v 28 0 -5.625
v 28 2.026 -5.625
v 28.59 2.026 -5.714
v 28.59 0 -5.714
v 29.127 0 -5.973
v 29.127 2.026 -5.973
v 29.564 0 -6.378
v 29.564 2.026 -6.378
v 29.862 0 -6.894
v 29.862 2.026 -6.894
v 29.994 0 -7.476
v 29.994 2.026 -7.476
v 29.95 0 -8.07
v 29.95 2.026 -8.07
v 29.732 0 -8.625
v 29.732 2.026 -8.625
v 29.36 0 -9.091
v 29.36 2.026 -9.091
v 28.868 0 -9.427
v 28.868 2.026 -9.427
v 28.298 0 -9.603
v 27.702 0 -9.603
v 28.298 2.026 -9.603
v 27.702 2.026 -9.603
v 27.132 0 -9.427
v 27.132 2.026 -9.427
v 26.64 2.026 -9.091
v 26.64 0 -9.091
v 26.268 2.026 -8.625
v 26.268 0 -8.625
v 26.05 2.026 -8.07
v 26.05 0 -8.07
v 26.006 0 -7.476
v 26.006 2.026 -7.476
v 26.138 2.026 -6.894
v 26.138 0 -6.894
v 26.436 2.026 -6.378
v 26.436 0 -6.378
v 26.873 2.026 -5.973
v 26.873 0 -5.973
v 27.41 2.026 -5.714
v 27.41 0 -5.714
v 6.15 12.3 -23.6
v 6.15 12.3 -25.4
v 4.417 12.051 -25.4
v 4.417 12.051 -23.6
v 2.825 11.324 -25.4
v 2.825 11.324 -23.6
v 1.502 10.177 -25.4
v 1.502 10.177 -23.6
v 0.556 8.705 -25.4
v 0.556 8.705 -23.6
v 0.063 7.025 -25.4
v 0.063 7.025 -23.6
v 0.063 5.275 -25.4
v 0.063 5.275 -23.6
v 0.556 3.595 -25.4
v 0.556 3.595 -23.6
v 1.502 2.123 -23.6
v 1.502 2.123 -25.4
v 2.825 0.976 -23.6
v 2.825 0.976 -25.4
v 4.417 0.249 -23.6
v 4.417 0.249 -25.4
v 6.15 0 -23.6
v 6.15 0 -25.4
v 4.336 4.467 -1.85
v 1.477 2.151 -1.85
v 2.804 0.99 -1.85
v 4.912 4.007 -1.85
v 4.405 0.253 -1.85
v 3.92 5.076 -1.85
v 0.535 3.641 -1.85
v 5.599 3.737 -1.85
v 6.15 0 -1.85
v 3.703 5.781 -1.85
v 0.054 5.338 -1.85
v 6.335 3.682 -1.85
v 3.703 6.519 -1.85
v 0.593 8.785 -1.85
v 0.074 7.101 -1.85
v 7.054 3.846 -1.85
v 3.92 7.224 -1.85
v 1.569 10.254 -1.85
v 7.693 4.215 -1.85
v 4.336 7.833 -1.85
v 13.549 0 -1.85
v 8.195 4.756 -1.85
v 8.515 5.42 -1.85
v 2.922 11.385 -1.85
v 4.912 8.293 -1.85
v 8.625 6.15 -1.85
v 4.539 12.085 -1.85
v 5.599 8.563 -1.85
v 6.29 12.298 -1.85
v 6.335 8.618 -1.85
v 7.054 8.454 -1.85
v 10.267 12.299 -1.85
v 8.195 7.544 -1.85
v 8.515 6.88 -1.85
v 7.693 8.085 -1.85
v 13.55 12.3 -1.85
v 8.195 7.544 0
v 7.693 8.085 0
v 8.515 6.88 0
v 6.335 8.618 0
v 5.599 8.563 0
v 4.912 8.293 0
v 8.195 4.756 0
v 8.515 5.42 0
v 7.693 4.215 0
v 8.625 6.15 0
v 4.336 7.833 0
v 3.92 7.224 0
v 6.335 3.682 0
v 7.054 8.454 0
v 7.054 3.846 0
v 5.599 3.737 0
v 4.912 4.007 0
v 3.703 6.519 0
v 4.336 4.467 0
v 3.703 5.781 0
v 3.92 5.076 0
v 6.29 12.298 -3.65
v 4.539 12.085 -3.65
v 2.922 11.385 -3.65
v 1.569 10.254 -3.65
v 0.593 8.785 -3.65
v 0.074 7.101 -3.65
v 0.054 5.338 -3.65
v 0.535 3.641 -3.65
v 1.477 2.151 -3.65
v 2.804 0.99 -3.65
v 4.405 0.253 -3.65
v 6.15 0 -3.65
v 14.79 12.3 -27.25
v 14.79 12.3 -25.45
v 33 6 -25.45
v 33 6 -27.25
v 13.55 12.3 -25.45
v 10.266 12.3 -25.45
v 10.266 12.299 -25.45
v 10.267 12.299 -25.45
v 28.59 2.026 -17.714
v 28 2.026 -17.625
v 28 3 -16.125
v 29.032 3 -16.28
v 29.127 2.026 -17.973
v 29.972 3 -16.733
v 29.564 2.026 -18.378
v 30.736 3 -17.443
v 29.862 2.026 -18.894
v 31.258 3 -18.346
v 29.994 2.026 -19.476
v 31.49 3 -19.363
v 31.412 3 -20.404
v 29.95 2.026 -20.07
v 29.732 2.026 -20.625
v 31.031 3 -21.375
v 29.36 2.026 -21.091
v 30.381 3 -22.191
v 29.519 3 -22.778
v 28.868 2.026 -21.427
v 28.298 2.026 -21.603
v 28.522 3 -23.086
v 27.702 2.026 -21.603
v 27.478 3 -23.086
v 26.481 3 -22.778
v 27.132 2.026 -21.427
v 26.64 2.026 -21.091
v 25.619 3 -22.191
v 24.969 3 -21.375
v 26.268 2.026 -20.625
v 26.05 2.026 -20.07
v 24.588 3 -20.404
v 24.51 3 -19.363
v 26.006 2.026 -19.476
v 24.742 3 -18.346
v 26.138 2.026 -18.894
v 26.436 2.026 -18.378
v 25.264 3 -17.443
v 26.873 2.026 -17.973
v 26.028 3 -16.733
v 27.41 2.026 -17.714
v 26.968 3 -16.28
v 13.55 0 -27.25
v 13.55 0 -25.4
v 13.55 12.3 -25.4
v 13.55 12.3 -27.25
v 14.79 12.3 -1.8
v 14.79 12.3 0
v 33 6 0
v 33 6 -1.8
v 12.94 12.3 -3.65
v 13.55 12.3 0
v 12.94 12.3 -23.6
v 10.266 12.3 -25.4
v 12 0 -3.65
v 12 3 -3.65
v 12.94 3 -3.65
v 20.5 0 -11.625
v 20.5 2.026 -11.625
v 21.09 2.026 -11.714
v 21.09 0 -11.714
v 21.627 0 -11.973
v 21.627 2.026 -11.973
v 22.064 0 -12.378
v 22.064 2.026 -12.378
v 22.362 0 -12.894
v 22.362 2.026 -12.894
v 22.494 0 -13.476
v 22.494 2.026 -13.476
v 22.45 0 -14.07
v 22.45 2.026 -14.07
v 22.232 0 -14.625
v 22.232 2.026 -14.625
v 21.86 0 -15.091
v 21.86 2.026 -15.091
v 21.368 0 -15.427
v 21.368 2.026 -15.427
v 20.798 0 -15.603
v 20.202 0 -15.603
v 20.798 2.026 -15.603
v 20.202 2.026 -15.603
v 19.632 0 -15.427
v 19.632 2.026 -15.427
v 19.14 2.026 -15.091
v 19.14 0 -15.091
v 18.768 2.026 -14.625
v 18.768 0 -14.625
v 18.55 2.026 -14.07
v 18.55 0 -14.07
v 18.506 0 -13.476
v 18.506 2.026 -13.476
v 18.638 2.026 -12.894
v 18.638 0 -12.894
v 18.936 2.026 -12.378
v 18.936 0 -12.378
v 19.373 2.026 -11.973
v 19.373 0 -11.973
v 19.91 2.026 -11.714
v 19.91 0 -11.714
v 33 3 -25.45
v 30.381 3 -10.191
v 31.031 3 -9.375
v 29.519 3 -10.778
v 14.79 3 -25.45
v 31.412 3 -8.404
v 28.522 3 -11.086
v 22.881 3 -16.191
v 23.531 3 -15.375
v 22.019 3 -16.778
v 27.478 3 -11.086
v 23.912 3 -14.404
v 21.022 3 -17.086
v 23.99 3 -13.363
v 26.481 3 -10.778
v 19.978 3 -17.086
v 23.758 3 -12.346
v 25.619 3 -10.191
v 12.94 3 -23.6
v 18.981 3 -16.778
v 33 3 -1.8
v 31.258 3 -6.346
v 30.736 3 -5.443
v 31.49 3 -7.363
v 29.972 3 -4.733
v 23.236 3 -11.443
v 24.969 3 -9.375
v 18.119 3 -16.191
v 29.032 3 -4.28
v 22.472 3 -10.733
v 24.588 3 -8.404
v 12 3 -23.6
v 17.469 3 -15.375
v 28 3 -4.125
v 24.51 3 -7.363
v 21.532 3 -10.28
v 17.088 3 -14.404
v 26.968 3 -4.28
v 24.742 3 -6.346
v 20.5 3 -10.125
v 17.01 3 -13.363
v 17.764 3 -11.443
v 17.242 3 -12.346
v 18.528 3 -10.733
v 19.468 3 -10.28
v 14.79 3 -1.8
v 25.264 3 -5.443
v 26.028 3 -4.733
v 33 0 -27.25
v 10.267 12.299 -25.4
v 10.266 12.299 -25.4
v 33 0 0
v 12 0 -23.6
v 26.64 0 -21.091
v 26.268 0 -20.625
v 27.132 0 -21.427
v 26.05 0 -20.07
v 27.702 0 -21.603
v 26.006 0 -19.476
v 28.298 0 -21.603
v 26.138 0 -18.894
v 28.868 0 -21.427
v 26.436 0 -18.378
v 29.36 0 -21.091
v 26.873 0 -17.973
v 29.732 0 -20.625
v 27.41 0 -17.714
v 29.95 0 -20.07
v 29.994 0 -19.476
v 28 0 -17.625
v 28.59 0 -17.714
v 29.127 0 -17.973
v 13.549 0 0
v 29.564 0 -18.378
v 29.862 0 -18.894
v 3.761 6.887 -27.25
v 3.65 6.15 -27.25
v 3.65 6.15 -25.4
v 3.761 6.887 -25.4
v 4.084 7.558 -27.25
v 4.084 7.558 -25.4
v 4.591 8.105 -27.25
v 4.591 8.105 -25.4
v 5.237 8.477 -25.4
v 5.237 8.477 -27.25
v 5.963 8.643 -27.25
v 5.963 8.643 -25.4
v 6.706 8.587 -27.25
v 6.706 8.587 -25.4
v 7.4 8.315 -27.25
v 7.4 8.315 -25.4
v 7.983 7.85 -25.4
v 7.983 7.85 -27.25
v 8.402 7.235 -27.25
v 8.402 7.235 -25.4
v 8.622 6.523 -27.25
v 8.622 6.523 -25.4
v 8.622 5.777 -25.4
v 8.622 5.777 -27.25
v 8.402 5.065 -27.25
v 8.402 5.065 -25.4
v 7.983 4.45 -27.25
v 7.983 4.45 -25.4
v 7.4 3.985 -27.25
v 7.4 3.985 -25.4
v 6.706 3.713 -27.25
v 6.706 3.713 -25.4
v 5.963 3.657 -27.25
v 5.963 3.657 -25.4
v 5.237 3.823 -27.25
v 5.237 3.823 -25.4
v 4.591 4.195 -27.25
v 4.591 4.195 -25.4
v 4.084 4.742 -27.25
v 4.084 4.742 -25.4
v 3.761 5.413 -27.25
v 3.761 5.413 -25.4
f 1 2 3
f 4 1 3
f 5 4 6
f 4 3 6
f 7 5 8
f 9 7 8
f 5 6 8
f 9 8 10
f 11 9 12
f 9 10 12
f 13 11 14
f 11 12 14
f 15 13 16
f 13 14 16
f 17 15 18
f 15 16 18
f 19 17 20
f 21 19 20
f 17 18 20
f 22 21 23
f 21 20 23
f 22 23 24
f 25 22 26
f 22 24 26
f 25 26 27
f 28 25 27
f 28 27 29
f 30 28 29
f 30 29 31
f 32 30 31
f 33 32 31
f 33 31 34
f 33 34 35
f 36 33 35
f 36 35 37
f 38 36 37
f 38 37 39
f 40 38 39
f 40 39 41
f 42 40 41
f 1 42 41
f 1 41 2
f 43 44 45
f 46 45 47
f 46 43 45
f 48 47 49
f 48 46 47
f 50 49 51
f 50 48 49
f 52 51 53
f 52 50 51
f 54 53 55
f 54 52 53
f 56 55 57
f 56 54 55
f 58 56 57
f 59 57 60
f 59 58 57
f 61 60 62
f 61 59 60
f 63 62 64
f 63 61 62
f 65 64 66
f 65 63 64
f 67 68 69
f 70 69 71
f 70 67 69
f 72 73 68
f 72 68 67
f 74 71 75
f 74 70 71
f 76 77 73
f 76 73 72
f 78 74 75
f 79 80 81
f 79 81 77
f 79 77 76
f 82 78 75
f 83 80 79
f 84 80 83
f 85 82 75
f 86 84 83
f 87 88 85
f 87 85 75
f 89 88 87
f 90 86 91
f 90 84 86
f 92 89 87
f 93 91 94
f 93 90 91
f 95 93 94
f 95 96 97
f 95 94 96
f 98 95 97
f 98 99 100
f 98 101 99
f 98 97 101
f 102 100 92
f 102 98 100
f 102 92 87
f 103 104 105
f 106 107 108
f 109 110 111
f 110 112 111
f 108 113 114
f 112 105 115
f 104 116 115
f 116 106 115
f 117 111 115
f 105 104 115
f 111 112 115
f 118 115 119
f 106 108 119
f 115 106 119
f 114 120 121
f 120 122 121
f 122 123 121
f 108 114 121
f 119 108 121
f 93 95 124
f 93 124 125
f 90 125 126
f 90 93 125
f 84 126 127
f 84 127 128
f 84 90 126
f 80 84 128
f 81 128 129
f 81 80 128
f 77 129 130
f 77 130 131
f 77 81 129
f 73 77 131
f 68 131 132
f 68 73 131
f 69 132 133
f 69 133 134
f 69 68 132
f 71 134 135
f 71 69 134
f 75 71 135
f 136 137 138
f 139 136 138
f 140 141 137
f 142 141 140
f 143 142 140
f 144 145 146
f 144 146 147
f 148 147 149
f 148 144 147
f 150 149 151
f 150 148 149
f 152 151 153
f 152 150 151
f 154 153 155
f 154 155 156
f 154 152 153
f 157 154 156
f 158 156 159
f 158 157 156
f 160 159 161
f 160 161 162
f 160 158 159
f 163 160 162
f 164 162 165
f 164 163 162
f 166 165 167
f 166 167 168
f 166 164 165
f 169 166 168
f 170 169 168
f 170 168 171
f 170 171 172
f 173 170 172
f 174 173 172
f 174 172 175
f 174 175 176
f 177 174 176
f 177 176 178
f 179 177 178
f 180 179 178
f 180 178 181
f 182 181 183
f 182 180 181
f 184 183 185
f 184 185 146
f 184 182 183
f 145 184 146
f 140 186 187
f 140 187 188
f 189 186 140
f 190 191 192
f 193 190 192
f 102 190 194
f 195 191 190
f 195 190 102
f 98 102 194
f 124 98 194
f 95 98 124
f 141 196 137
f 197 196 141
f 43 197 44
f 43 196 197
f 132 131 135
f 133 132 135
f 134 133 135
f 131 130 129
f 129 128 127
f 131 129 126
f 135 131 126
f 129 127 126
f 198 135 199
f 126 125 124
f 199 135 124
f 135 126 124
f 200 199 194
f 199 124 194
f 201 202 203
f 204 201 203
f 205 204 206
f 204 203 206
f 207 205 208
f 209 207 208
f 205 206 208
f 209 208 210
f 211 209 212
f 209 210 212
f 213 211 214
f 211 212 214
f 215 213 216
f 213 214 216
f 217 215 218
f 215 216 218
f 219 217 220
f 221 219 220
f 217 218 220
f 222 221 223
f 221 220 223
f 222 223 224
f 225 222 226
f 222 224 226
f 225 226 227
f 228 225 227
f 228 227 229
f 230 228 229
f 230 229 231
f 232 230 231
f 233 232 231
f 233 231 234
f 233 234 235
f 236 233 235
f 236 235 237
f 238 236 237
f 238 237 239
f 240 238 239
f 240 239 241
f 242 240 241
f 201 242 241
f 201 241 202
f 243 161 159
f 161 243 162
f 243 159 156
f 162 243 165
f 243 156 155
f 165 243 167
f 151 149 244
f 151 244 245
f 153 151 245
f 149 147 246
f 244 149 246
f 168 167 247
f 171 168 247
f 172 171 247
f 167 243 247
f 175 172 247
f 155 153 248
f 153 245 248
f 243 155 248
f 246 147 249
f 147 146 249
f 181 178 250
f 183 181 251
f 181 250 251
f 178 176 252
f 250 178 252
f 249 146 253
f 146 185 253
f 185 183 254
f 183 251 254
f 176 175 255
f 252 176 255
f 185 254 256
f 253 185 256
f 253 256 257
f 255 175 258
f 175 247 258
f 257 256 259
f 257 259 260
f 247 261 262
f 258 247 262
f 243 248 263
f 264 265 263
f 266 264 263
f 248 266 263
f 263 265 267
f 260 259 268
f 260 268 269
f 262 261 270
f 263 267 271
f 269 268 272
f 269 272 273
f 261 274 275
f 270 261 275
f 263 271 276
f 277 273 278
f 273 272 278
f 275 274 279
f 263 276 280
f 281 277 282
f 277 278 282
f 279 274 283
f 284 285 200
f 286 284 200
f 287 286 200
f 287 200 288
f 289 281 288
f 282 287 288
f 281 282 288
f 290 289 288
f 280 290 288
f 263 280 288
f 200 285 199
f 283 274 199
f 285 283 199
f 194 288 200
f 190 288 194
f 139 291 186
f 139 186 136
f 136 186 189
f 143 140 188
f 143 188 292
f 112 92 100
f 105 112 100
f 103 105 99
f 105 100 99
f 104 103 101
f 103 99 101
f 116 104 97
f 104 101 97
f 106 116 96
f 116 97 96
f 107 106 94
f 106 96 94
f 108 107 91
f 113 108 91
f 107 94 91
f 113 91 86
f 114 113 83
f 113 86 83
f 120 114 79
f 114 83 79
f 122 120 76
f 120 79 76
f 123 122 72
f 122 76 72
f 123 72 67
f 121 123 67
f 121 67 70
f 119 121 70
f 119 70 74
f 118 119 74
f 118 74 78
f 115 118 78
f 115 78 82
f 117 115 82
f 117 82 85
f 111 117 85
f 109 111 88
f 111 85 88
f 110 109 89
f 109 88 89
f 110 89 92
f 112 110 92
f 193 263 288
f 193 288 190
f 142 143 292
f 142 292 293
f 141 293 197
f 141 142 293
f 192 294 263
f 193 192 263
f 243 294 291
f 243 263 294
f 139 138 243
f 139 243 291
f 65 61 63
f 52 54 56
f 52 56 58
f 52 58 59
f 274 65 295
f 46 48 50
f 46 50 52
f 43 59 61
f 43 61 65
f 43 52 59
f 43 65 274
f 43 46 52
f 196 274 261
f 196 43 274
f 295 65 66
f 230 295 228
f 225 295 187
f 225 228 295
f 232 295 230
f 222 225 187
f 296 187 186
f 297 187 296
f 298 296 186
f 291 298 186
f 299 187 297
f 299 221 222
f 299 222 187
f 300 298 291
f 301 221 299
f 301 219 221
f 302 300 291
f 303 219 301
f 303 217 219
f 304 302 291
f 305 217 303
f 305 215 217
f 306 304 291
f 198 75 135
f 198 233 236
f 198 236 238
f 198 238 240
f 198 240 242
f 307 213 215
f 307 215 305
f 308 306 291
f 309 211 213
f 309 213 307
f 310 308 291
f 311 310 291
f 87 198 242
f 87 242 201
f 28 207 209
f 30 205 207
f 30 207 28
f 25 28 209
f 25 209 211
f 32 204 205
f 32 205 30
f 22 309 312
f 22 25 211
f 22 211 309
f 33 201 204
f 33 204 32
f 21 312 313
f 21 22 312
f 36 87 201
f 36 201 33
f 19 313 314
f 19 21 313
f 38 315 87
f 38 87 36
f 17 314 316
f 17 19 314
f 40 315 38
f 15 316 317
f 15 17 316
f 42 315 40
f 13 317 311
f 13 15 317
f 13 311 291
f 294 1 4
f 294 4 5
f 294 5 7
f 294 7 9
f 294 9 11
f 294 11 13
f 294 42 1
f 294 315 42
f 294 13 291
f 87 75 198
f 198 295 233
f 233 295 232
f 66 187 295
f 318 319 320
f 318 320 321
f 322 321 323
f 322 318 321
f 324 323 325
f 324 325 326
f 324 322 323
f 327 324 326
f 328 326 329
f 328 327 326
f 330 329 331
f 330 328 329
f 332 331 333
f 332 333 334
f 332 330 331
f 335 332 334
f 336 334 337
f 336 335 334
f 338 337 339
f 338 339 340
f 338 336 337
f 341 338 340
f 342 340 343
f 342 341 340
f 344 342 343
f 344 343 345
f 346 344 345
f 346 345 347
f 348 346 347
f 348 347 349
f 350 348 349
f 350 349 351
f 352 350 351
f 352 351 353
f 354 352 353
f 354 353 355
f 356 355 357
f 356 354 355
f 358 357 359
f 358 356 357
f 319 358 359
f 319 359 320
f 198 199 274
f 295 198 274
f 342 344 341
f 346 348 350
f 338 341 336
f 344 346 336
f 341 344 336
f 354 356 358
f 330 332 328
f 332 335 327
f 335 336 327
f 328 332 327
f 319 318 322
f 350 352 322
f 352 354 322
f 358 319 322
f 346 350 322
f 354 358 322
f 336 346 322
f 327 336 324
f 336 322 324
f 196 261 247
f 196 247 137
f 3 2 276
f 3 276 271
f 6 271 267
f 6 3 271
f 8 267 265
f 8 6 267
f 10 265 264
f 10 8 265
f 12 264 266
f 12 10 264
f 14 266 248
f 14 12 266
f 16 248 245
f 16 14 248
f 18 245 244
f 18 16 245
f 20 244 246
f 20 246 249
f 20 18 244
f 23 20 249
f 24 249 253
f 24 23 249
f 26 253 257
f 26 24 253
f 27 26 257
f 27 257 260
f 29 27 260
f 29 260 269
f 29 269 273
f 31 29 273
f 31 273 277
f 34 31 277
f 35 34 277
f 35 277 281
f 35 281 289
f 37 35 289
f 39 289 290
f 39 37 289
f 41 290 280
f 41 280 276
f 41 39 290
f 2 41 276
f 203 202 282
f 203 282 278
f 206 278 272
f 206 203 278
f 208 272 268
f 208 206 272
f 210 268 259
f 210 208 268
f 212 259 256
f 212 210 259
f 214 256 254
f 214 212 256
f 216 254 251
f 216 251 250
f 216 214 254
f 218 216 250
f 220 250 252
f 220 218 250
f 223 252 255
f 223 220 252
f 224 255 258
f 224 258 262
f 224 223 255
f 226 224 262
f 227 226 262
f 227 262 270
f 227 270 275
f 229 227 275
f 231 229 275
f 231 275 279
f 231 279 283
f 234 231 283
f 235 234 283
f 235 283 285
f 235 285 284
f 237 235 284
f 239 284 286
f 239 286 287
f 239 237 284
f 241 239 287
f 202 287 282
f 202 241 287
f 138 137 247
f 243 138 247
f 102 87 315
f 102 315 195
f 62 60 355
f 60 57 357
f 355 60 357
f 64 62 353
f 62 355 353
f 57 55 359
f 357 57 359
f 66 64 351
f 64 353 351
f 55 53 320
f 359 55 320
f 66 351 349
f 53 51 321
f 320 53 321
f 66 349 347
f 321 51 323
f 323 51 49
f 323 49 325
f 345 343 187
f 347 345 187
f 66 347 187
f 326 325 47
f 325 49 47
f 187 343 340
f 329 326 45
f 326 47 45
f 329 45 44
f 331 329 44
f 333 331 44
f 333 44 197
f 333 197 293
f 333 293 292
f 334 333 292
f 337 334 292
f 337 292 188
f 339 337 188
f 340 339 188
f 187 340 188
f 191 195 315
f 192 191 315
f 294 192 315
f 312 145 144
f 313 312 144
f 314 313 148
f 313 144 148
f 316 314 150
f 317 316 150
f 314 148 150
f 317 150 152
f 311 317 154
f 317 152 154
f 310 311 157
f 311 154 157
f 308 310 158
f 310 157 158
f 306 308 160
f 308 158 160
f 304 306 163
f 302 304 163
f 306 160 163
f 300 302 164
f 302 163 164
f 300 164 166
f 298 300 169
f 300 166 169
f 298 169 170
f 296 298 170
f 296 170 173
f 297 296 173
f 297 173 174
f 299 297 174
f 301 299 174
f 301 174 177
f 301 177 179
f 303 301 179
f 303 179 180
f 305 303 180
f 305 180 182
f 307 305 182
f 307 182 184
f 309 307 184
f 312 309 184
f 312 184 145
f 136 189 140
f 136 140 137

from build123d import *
from build123d.topology import SkipClean

# Parameters (mm, degrees)
PROFILEBOSS_EXTRUDE1_DEPTH           = 33
SKETCH2_OUTSIDE_W                    = 43.906
SKETCH2_OUTSIDE_H                    = 23.206
SIDEPROFILECUT_EXTRUDE1_DEPTH        = 45.529231972
SKETCH3_W                            = 11.132045058
SKETCH3_H                            = 23.65
BOTTOMCUT_EXTRUDE2_DEPTH             = 44.795576261
DRAGLINKMOUNTHOLESSKETCH4_R          = 2
DRAGLINKMOUNTHOLESCUT_EXTRUDE3_DEPTH = 44.795576261
CHAMFER1_SIZE                        = 1.5
CHAMFER1_SIZE2                       = 0.97411139
RIGHTINNERBOSS_EXTRUDE3_START        = 1.85
RIGHTINNERBOSS_EXTRUDE3_DEPTH        = 1.85
LEFTINNERBOSS_EXTRUDE4_DEPTH         = 1.85
RIGHTOUTERCIRCLESKETCH7_R            = 2.5
RIGHTOUTERCIRCLECUT_EXTRUDE4_DEPTH   = 1.85
LEFTOUTERCIRCLECUT_EXTRUDE5_START    = -1.85
SKETCH8_R                            = 2.475
LEFTOUTERCIRCLECUT_EXTRUDE5_DEPTH    = 1.85
CHAMFER2_SIZE                        = 1.85


with BuildPart() as part:
    # Sketch1 → ProfileBoss-Extrude1 (new body)
    with BuildSketch(Plane(origin=(0, 0, 0), x_dir=(0, 0, -1), z_dir=(1, 0, 0))):
        Polygon((0, 12.3), (0, 0), (27.25, 0), (27.25, 12.3), (25.45, 12.3), (25.45, 3), (1.8, 3), (1.8, 12.3), align=None)
    extrude(amount=PROFILEBOSS_EXTRUDE1_DEPTH)

    # Sketch2 outside → SideProfileCut-Extrude1 (cut, through all)
    with BuildSketch(Plane.XY):
        with Locations((16.5, 6.15)):
            Rectangle(SKETCH2_OUTSIDE_W, SKETCH2_OUTSIDE_H)
        with BuildLine():
            Line((14.789600469, 12.3), (33, 6))
            Line((33, 6), (33, 0))
            Line((33, 0), (6.15, 0))
            ThreePointArc((6.15, 0), (0.000396167, 6.219804731), (6.289600469, 12.298415382))
            Line((6.289600469, 12.298415382), (14.789600469, 12.3))
        make_face(mode=Mode.SUBTRACT)
    extrude(amount=-SIDEPROFILECUT_EXTRUDE1_DEPTH, mode=Mode.SUBTRACT)

    # Sketch3 → BottomCut-Extrude2 (cut, through all)
    with BuildSketch(Plane(origin=(0, 3, 0), x_dir=(1, 0, 0), z_dir=(0, 1, 0))):
        with Locations((6.433977471, 13.625)):
            Rectangle(SKETCH3_W, SKETCH3_H)
    extrude(amount=-BOTTOMCUT_EXTRUDE2_DEPTH, mode=Mode.SUBTRACT)

    # DragLinkMountHolesSketch4 → DragLinkMountHolesCut-Extrude3 (cut, through all)
    with BuildSketch(Plane(origin=(0, 3, 0), x_dir=(1, 0, 0), z_dir=(0, 1, 0))):
        with Locations(Location((28, 19.625, 0), (0, 0, 270))):
            Circle(DRAGLINKMOUNTHOLESSKETCH4_R)
        with Locations(Location((28, 7.625, 0), (0, 0, 270))):
            Circle(DRAGLINKMOUNTHOLESSKETCH4_R)
        with Locations(Location((20.5, 13.625, 0), (0, 0, 270))):
            Circle(DRAGLINKMOUNTHOLESSKETCH4_R)
    extrude(amount=-DRAGLINKMOUNTHOLESCUT_EXTRUDE3_DEPTH, mode=Mode.SUBTRACT)

    # Chamfer1
    chamfer1_edges = [part.edges().sort_by_distance(p)[0] for p in [
        (28, 3, -21.625),
        (28, 3, -9.625),
        (20.5, 3, -15.625),
    ]]
    chamfer1_side = [part.faces().sort_by_distance(p)[0] for p in [
        (12.316278754, 3, -13.625),
    ]]
    chamfer(chamfer1_edges, length=CHAMFER1_SIZE, length2=CHAMFER1_SIZE2, reference=chamfer1_side[0])

    # Sketch11 → RightInnerBoss-Extrude3 (add)
    with BuildSketch(Plane.XY.offset(-25.45).offset(RIGHTINNERBOSS_EXTRUDE3_START)):
        with BuildLine():
            Line((14.789600469, 12.3), (6.15, 12.3))
            ThreePointArc((6.15, 12.3), (0, 6.15), (6.15, 0))
            Line((6.15, 0), (14.789600469, 0))
            Line((14.789600469, 0), (14.789600469, 12.3))
        make_face()
    extrude(amount=-RIGHTINNERBOSS_EXTRUDE3_DEPTH)

    # Sketch12 → LeftInnerBoss-Extrude4 (add)
    with SkipClean():  # the faces are left unmerged after this step: merging them gives an invalid solid
        with BuildSketch(Plane(origin=(0, 0, -1.8), x_dir=(-1, 0, 0), z_dir=(0, 0, -1))):
            with BuildLine():
                Line((-14.789600469, 12.3), (-6.289600469, 12.298415382))
                ThreePointArc((-6.289600469, 12.298415382), (-0.000396167, 6.219804731), (-6.15, 0))
                Line((-6.15, 0), (-14.789600469, 0))
                Line((-14.789600469, 0), (-14.789600469, 12.3))
            make_face()
        extrude(amount=LEFTINNERBOSS_EXTRUDE4_DEPTH)

    # RightOuterCircleSketch7 → RightOuterCircleCut-Extrude4 (cut)
    with SkipClean():  # the faces are left unmerged after this step: merging them gives an invalid solid
        with BuildSketch(Plane(origin=(0, 0, -27.25), x_dir=(-1, 0, 0), z_dir=(0, 0, -1))):
            with BuildLine():
                Line((-13.55, 12.299768907), (-10.266779115, 12.29915683))
                ThreePointArc((-10.266779115, 12.29915683), (1.249999961, 6.150757924), (-10.265519408, 0))
                Line((-10.265519408, 0), (-13.55, 0))
                Line((-13.55, 0), (-13.55, 12.299768907))
            make_face()
            with Locations((-6.15, 6.15)):
                Circle(RIGHTOUTERCIRCLESKETCH7_R, mode=Mode.SUBTRACT)
        extrude(amount=-RIGHTOUTERCIRCLECUT_EXTRUDE4_DEPTH, mode=Mode.SUBTRACT)

    # Sketch8 → LeftOuterCircleCut-Extrude5 (cut)
    with BuildSketch(Plane.XY.offset(LEFTOUTERCIRCLECUT_EXTRUDE5_START)):
        with BuildLine():
            Line((13.550000004, 12.299768907), (10.266779119, 12.29915683))
            ThreePointArc((10.266779119, 12.29915683), (-1.249999964, 6.150757924), (10.265519413, 0))
            Line((10.265519413, 0), (13.548740355, 0))
            Line((13.548740355, 0), (13.550000004, 12.299768907))
        make_face()
        with Locations((6.15, 6.15)):
            Circle(SKETCH8_R, mode=Mode.SUBTRACT)
    extrude(amount=LEFTOUTERCIRCLECUT_EXTRUDE5_DEPTH, mode=Mode.SUBTRACT)

    # Chamfer2
    chamfer2_edges = [part.edges().sort_by_distance(p)[0] for p in [
        (14.789600469, 7.65, -23.6),
        (14.789600469, 7.65, -3.65),
    ]]
    chamfer(chamfer2_edges, length=CHAMFER2_SIZE - 0.0001)  # a hair under: the kernel refuses the full size


solid = part.part
